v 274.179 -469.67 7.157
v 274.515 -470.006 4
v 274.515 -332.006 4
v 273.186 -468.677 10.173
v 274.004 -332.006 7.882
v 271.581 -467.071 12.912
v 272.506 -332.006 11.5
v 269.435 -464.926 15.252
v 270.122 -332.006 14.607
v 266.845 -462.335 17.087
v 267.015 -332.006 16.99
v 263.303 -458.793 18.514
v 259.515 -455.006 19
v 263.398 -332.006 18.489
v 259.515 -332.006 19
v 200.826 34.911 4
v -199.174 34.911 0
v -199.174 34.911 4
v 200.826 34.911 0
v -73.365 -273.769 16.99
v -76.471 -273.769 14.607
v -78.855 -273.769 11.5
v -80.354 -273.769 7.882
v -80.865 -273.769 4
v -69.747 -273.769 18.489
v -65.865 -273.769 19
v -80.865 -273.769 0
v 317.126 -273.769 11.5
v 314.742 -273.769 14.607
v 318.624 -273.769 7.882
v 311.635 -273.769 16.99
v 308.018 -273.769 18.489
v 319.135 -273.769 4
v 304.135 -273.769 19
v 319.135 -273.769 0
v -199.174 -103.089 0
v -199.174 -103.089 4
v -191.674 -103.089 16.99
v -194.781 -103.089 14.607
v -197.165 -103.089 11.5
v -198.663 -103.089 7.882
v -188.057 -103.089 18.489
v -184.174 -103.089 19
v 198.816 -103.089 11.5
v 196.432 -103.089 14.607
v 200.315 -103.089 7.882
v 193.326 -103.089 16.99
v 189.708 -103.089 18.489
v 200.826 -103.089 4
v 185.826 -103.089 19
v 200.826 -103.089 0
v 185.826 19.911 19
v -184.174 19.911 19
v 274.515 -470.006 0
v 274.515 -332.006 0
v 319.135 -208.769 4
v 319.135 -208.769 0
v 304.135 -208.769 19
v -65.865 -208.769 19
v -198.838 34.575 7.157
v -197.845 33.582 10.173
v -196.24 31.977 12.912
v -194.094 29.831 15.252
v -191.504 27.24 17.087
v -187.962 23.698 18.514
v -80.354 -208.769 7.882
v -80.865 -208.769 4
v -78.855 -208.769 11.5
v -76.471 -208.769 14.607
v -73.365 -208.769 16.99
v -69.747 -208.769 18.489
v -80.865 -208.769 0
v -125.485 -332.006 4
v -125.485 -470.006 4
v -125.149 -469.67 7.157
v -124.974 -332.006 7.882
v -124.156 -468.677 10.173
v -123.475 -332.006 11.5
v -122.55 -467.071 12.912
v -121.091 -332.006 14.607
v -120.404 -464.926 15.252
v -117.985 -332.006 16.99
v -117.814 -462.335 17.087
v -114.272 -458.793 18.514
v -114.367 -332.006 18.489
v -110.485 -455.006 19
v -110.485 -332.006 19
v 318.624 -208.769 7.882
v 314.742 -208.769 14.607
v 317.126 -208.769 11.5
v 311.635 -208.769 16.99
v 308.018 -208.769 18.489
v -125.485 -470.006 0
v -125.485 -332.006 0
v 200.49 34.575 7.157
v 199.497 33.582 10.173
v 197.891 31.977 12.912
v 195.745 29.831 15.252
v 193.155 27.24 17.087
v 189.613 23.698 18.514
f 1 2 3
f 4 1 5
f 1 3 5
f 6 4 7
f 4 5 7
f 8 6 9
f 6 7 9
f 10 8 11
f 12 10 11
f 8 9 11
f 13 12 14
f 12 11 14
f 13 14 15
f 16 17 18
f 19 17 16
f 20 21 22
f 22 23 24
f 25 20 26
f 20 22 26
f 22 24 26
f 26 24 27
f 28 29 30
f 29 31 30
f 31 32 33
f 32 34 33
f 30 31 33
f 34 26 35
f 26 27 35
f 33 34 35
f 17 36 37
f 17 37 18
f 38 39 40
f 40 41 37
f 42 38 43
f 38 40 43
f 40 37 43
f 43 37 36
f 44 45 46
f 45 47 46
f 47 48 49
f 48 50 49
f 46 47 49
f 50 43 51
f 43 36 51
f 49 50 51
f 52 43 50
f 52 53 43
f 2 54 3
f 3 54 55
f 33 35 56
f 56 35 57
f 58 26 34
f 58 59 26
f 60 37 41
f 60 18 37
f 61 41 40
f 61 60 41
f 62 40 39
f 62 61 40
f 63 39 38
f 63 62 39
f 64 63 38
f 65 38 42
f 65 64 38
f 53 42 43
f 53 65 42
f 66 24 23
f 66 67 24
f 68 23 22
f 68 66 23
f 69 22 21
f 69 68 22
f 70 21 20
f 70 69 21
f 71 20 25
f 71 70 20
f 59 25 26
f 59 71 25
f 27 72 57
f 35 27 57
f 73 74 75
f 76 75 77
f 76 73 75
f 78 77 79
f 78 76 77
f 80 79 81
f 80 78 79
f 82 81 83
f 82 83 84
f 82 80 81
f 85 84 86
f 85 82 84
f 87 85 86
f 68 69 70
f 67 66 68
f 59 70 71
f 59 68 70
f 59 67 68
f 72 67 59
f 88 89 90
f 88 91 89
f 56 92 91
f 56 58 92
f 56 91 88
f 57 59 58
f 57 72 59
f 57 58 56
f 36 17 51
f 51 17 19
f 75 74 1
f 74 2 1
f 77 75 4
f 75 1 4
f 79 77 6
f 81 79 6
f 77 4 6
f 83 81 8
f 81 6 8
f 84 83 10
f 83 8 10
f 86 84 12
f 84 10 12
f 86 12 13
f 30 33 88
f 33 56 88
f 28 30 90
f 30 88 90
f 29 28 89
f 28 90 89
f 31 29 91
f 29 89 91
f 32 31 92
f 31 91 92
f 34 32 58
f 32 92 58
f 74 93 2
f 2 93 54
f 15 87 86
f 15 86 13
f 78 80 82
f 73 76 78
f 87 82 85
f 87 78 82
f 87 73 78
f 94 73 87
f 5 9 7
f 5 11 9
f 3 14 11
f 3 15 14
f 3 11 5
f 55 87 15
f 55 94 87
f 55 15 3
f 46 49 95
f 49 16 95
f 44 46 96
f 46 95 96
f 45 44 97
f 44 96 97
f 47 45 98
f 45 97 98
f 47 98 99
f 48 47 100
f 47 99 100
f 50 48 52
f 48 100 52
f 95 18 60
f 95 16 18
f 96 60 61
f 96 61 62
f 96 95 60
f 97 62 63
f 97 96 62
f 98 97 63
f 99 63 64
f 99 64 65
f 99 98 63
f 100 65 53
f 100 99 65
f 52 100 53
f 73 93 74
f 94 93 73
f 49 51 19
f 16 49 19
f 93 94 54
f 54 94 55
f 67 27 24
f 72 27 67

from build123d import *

# Parameters (mm, degrees)
F0_W     = 400
F0_H     = 138
F1_DEPTH = 19
F2_W     = 400
F2_H     = 65
F3_DEPTH = 19
F4_W     = 400
F4_H     = 138
F5_DEPTH = 19
F6_R     = 15
F6_2_R   = 15
F6_3_R   = 15


with BuildPart() as f1:
    # F0 (on Top) → F1 (new body)
    with BuildSketch(Plane.XY):
        with Locations((0.82577, -34.089036)):
            Rectangle(F0_W, F0_H)
    extrude(amount=F1_DEPTH)

    # F6#3
    f6_3_edges = [f1.edges().sort_by_distance(p)[0] for p in [
        (-199.17423, -34.089036, 19),
        (0.82577, 34.910964, 19),
        (200.82577, -34.089036, 19),
    ]]
    fillet(f6_3_edges, radius=F6_3_R)


with BuildPart() as f3:
    # F2 (on Top) → F3 (new body)
    with BuildSketch(Plane.XY):
        with Locations((119.135375, -241.269276)):
            Rectangle(F2_W, F2_H)
    extrude(amount=F3_DEPTH)

    # F6#2
    f6_2_edges = [f3.edges().sort_by_distance(p)[0] for p in [
        (319.135375, -241.269276, 19),
        (-80.864625, -241.269276, 19),
    ]]
    fillet(f6_2_edges, radius=F6_2_R)


with BuildPart() as f5:
    # F4 (on Top) → F5 (new body)
    with BuildSketch(Plane.XY):
        with Locations((74.51532, -401.005851)):
            Rectangle(F4_W, F4_H)
    extrude(amount=F5_DEPTH)

    # F6
    f6_edges = [f5.edges().sort_by_distance(p)[0] for p in [
        (-125.48468, -401.005851, 19),
        (74.51532, -470.005851, 19),
        (274.51532, -401.005851, 19),
    ]]
    fillet(f6_edges, radius=F6_R)


solid = Compound([f1.part, f3.part, f5.part])
